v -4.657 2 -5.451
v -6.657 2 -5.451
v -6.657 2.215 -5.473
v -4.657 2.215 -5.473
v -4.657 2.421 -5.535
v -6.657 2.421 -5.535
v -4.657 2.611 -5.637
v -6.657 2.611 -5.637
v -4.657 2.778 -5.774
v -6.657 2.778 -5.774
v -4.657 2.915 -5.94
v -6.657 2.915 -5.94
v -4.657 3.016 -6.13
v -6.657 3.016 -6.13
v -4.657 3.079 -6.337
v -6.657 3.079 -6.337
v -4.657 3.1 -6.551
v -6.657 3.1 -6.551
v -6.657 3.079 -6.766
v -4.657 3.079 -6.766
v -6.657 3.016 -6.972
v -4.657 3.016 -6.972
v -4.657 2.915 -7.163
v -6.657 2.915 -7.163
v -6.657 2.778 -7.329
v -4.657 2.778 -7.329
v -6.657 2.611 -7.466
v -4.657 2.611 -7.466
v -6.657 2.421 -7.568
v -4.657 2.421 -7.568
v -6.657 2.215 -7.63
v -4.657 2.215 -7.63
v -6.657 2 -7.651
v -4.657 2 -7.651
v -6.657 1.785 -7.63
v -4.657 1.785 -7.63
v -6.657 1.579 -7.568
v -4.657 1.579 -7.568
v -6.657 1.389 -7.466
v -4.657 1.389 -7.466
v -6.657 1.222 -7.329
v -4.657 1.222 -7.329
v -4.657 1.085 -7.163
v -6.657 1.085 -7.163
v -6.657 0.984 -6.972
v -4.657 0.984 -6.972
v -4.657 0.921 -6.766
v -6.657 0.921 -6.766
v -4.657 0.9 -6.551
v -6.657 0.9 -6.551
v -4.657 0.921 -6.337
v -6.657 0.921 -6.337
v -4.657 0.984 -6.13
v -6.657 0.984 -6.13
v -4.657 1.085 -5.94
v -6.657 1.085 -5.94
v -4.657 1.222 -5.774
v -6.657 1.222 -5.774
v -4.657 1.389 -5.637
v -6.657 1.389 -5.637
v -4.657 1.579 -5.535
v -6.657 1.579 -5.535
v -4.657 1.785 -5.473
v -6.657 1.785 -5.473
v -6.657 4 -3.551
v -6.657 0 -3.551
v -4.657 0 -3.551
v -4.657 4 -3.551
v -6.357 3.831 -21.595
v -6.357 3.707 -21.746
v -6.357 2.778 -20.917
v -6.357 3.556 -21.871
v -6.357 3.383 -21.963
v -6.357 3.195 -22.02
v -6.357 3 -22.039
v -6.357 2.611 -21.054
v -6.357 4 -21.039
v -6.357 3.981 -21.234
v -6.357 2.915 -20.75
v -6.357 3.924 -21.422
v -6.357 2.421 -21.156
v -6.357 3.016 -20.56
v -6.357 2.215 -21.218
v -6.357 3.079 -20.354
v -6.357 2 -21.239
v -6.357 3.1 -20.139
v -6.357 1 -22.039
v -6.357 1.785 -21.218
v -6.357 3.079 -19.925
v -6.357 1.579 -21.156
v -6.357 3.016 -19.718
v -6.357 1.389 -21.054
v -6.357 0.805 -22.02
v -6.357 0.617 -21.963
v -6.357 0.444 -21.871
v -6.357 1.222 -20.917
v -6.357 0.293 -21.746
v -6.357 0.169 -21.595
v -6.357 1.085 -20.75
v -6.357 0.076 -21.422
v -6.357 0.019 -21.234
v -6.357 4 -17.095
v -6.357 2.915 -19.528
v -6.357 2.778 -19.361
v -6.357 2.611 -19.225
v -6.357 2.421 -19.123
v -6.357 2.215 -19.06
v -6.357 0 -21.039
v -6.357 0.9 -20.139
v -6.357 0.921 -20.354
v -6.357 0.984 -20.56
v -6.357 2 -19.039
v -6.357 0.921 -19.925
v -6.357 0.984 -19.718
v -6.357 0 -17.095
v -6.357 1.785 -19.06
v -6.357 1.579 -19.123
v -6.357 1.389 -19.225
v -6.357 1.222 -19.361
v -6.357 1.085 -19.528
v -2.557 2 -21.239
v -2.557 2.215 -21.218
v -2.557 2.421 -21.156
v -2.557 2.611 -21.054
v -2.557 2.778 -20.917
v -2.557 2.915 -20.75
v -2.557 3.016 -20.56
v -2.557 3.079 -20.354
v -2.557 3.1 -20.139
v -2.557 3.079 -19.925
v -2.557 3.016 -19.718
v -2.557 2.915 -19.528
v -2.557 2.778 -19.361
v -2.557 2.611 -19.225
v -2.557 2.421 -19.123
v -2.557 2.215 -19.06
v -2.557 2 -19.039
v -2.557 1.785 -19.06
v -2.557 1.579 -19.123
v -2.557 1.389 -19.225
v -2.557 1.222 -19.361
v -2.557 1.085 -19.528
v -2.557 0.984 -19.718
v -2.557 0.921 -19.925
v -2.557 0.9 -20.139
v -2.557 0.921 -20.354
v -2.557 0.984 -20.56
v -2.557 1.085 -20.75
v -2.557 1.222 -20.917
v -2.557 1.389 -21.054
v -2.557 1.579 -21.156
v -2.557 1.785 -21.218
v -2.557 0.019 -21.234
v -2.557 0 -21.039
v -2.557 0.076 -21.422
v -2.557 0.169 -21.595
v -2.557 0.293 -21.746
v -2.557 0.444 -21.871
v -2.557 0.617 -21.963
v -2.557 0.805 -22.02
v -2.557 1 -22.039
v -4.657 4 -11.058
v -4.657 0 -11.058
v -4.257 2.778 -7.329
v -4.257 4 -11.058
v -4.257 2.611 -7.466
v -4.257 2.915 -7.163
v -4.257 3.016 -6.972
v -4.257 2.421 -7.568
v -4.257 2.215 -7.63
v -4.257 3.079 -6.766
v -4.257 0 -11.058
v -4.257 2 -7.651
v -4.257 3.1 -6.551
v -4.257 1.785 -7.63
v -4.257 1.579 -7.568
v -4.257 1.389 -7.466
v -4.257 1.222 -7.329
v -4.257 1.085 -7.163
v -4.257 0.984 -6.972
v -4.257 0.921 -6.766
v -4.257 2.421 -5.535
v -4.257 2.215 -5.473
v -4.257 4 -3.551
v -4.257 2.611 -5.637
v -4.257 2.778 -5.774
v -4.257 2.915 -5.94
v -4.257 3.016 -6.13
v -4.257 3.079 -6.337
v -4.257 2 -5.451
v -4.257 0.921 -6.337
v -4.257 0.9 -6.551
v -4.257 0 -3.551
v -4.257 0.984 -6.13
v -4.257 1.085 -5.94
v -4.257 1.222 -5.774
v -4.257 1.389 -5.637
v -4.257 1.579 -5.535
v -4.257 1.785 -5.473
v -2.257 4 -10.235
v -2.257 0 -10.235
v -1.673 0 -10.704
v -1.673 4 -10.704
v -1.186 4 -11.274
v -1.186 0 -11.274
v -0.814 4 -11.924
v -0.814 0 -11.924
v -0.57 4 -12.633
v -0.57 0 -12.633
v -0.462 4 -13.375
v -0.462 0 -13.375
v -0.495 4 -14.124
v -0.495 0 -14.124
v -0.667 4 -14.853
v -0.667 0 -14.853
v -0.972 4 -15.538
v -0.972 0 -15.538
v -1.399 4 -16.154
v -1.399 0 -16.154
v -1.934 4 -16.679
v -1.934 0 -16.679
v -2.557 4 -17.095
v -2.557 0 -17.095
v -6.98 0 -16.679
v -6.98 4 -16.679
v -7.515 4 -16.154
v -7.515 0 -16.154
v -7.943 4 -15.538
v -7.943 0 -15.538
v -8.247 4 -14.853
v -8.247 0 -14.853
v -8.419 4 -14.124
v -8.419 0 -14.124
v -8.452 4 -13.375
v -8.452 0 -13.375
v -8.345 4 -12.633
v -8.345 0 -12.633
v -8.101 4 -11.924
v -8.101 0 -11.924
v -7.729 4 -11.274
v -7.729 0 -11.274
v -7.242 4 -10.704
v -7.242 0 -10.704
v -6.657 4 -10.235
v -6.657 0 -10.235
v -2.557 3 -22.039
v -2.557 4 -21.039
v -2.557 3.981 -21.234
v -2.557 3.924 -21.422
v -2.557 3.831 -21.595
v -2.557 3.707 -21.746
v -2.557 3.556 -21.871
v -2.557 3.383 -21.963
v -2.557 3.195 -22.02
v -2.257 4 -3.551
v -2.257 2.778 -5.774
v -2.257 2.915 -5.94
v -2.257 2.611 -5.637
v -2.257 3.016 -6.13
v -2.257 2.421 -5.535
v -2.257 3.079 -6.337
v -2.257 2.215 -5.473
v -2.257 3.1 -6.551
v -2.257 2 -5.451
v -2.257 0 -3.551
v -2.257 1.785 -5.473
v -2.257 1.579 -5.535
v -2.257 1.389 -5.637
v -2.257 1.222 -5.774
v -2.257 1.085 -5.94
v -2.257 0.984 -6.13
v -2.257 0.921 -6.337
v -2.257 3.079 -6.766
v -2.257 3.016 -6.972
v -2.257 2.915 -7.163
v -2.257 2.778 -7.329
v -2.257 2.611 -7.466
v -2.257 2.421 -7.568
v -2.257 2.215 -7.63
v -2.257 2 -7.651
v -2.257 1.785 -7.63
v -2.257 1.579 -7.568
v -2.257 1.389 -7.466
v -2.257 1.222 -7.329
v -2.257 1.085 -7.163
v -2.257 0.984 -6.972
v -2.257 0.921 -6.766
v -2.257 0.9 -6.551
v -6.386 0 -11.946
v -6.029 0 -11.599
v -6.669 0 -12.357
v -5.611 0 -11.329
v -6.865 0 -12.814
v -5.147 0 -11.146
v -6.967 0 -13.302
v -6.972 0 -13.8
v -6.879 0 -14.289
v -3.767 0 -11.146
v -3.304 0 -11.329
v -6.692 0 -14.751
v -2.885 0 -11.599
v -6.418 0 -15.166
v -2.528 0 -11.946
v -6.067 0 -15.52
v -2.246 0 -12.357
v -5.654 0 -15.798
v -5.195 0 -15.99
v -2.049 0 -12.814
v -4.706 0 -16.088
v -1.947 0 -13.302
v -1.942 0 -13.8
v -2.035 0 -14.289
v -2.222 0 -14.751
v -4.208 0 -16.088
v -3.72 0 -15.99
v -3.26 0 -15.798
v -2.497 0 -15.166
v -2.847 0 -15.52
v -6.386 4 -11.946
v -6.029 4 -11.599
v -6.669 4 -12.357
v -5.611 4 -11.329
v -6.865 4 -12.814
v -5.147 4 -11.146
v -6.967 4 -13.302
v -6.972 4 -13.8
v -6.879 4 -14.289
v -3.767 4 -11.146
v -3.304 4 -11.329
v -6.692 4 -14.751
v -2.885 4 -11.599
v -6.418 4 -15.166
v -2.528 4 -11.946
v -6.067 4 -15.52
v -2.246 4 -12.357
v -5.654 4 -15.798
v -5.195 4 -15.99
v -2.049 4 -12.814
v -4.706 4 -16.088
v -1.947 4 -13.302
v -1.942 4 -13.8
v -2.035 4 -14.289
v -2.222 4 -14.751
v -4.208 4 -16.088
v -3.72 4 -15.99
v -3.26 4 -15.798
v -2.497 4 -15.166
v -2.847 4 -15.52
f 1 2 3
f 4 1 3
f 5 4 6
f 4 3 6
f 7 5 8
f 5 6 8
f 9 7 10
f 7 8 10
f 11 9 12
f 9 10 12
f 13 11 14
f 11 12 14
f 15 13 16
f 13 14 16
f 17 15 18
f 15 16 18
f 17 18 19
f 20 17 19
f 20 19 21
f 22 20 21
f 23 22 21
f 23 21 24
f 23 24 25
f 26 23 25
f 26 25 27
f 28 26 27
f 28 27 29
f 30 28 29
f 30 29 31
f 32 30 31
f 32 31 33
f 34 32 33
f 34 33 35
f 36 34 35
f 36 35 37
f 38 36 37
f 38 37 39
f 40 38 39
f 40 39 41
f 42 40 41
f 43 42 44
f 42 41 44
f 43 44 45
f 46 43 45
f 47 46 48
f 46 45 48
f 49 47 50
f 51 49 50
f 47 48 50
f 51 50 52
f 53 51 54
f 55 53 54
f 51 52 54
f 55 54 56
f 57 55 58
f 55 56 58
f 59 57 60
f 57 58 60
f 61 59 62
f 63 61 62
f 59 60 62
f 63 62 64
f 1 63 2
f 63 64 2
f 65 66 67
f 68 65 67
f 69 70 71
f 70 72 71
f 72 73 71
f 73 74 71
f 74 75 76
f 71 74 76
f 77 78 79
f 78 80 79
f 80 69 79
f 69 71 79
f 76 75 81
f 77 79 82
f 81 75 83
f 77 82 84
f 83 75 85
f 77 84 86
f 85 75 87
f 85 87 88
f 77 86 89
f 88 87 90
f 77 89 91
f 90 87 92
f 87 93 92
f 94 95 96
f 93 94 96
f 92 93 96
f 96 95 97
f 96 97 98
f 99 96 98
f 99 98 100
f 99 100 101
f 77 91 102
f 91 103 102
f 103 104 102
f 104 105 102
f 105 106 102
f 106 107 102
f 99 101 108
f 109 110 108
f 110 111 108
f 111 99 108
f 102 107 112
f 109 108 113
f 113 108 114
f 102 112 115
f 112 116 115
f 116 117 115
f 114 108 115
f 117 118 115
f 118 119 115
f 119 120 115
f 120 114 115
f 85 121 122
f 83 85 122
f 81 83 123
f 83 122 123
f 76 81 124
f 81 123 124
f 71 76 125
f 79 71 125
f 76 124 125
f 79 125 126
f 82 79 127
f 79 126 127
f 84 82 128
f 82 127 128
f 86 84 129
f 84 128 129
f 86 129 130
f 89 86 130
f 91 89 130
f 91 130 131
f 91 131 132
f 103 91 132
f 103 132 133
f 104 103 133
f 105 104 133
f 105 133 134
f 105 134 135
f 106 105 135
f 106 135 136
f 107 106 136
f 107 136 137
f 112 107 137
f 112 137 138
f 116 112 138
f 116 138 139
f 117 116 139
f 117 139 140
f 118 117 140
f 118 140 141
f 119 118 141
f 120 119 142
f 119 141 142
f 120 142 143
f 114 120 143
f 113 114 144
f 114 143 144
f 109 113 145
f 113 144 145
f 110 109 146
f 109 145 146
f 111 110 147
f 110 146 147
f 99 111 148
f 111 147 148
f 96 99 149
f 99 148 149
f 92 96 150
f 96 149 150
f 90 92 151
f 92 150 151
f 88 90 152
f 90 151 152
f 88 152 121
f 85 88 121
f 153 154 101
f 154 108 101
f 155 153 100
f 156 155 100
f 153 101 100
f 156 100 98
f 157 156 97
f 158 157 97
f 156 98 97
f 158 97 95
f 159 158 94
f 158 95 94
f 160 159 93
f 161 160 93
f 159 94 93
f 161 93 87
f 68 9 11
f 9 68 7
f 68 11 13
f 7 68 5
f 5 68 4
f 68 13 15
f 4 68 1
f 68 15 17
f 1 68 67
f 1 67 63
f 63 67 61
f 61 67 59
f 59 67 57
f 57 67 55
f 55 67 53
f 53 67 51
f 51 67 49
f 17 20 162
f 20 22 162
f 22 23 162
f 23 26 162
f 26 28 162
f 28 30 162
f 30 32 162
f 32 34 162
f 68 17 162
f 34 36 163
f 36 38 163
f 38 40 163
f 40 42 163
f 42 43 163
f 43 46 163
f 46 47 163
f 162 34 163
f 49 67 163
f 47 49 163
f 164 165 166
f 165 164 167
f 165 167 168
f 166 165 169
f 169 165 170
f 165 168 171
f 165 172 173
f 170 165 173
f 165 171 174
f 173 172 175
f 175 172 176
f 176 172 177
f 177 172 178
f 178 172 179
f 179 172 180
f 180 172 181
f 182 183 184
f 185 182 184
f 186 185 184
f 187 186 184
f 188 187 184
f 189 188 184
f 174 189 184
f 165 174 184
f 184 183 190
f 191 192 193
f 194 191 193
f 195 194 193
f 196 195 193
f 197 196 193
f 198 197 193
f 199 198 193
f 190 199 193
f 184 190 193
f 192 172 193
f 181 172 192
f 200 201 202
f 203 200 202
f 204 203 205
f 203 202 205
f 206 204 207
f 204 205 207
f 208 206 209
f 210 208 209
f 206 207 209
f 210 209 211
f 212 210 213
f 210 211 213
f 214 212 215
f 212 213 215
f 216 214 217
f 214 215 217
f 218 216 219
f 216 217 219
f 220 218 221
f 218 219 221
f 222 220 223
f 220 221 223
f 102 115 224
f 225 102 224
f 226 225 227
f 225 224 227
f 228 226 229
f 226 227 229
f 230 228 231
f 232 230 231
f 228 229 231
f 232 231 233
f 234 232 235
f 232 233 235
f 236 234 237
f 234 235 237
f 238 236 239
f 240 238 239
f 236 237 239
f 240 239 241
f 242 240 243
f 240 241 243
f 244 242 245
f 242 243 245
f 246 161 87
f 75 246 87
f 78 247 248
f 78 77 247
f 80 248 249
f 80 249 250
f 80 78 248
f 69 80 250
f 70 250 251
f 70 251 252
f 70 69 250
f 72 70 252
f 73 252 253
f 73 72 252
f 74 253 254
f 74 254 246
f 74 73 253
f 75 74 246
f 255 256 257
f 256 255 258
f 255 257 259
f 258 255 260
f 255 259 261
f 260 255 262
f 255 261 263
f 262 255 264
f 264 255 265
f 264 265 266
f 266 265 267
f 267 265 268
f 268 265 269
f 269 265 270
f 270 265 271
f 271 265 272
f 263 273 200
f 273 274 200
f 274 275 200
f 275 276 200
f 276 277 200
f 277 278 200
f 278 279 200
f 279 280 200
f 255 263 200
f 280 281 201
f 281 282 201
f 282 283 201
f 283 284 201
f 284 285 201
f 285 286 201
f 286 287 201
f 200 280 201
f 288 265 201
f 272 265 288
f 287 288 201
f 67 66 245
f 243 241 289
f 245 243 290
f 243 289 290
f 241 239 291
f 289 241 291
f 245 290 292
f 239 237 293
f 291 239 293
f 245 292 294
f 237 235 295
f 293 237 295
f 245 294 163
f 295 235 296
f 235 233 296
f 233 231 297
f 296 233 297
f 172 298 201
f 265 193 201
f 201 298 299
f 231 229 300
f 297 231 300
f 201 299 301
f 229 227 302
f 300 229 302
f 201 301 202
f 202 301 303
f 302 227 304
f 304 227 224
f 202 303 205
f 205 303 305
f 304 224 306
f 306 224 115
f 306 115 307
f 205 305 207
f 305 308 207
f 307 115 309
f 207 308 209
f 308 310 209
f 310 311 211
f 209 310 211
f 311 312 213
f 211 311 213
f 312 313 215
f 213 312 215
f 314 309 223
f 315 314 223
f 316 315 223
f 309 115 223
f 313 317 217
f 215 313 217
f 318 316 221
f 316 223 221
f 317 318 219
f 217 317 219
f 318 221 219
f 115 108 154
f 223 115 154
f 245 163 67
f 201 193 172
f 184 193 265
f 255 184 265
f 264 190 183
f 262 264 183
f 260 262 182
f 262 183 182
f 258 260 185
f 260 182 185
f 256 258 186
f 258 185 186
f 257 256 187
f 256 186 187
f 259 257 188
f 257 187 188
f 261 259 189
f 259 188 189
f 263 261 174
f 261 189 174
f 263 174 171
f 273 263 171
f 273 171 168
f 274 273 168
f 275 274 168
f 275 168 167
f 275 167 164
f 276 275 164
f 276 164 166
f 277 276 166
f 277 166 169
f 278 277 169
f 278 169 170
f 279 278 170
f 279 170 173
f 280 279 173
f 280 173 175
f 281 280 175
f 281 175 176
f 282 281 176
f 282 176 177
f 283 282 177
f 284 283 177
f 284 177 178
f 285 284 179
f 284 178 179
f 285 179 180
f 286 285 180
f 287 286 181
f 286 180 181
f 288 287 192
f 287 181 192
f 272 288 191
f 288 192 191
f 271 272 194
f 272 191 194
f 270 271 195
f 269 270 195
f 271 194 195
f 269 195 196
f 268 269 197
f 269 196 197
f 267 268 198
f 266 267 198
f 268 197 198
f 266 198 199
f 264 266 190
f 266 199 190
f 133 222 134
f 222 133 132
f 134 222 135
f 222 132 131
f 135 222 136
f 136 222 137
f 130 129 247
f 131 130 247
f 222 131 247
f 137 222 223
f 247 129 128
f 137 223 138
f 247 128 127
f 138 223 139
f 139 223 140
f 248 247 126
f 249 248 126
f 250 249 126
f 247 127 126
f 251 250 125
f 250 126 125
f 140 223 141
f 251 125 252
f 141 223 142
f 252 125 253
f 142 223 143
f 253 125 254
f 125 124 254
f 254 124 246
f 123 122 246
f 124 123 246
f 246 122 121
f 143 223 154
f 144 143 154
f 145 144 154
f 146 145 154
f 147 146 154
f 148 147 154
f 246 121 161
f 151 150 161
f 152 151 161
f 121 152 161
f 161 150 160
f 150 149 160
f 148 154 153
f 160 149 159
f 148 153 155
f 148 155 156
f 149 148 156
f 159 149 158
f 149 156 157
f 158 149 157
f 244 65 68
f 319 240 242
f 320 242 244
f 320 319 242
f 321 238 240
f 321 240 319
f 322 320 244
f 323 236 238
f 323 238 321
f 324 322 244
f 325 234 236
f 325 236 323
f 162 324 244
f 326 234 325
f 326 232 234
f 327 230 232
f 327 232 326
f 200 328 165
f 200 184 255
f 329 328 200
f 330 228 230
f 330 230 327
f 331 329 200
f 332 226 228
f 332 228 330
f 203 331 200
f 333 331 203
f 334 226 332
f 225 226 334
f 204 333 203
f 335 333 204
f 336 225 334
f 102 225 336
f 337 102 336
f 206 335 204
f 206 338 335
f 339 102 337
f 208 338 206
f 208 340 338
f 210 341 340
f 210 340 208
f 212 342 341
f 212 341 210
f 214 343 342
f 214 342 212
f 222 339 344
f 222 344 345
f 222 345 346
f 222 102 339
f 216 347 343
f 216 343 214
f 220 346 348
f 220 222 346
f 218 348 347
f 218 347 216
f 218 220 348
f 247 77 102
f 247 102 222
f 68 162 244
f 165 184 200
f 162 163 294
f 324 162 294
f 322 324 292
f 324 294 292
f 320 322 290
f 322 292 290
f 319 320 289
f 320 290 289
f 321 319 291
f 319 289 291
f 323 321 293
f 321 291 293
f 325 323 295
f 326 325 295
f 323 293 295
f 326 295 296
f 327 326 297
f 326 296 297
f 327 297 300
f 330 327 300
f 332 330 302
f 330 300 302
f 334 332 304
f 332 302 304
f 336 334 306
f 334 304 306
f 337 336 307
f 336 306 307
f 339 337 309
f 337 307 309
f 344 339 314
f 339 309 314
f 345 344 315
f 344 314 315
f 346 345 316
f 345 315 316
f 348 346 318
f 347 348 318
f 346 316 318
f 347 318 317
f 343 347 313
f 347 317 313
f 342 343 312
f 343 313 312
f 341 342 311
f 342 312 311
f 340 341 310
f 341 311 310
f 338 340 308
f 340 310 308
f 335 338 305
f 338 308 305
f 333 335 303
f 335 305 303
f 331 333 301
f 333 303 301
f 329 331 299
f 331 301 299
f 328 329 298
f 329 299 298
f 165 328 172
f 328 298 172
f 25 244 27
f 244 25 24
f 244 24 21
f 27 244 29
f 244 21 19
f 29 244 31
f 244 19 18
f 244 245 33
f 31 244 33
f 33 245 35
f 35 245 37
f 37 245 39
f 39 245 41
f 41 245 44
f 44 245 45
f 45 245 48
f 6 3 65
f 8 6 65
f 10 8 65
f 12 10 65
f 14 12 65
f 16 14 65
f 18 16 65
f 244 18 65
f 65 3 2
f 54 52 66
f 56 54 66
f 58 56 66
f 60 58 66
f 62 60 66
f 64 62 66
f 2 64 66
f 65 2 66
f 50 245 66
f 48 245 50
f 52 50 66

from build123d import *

# Parameters (mm, degrees)
EXTRUDE_1_DEPTH     = 4
SKETCH_2_R          = 1.1
CUT_EXTRUDE_1_DEPTH = 4
SKETCH_3_R          = 1.1
CUT_EXTRUDE_2_DEPTH = 5
FILLET_3_R          = 1


with BuildPart() as part:
    # 草图1 → 凸台-拉伸1 (new body)
    with BuildSketch(Plane(origin=(0, 0, 0), x_dir=(1, 0, 0), z_dir=(0, 1, 0))):
        with BuildLine():
            Line((-6.657117104, 10.234542642), (-6.657117104, 3.551431113))
            Line((-6.657117104, 3.551431113), (-4.657117104, 3.551431113))
            Line((-4.657117104, 3.551431113), (-4.657117104, 11.058134514))
            ThreePointArc((-4.657117104, 11.058134514), (-4.457117104, 16.10020126), (-4.257117104, 11.058134514))
            Line((-4.257117104, 11.058134514), (-4.257117104, 3.551431113))
            Line((-4.257117104, 3.551431113), (-2.257117104, 3.551431113))
            Line((-2.257117104, 3.551431113), (-2.257117104, 10.234542642))
            ThreePointArc((-2.257117104, 10.234542642), (-0.460935895, 13.749946041), (-2.557117104, 17.095144441))
            Line((-2.557117104, 17.095144441), (-2.557117104, 22.039302875))
            Line((-2.557117104, 22.039302875), (-6.357117104, 22.039302875))
            Line((-6.357117104, 22.039302875), (-6.357117104, 17.095144441))
            ThreePointArc((-6.357117104, 17.095144441), (-8.453298314, 13.749946041), (-6.657117104, 10.234542642))
        make_face()
    extrude(amount=EXTRUDE_1_DEPTH)

    # 草图2 → 切除-拉伸1 (cut)
    with BuildSketch(Plane(origin=(-2.457117104, 0, 0), x_dir=(0, 0, -1), z_dir=(1, 0, 0))):
        with Locations((20.139302875, 2)):
            Circle(SKETCH_2_R)
    extrude(amount=-CUT_EXTRUDE_1_DEPTH, mode=Mode.SUBTRACT)

    # 草图3 → 切除-拉伸2 (cut)
    with BuildSketch(Plane.ZY.offset(6.657117104)):
        with Locations((-6.551431113, 2)):
            Circle(SKETCH_3_R)
    extrude(amount=-CUT_EXTRUDE_2_DEPTH, mode=Mode.SUBTRACT)

    # 圆角3
    fillet_3_edges = [part.edges().sort_by_distance(p)[0] for p in [
        (-4.457117104, 4, -22.039302875),
        (-4.457117104, 0, -22.039302875),
    ]]
    fillet(fillet_3_edges, radius=FILLET_3_R)


solid = part.part
